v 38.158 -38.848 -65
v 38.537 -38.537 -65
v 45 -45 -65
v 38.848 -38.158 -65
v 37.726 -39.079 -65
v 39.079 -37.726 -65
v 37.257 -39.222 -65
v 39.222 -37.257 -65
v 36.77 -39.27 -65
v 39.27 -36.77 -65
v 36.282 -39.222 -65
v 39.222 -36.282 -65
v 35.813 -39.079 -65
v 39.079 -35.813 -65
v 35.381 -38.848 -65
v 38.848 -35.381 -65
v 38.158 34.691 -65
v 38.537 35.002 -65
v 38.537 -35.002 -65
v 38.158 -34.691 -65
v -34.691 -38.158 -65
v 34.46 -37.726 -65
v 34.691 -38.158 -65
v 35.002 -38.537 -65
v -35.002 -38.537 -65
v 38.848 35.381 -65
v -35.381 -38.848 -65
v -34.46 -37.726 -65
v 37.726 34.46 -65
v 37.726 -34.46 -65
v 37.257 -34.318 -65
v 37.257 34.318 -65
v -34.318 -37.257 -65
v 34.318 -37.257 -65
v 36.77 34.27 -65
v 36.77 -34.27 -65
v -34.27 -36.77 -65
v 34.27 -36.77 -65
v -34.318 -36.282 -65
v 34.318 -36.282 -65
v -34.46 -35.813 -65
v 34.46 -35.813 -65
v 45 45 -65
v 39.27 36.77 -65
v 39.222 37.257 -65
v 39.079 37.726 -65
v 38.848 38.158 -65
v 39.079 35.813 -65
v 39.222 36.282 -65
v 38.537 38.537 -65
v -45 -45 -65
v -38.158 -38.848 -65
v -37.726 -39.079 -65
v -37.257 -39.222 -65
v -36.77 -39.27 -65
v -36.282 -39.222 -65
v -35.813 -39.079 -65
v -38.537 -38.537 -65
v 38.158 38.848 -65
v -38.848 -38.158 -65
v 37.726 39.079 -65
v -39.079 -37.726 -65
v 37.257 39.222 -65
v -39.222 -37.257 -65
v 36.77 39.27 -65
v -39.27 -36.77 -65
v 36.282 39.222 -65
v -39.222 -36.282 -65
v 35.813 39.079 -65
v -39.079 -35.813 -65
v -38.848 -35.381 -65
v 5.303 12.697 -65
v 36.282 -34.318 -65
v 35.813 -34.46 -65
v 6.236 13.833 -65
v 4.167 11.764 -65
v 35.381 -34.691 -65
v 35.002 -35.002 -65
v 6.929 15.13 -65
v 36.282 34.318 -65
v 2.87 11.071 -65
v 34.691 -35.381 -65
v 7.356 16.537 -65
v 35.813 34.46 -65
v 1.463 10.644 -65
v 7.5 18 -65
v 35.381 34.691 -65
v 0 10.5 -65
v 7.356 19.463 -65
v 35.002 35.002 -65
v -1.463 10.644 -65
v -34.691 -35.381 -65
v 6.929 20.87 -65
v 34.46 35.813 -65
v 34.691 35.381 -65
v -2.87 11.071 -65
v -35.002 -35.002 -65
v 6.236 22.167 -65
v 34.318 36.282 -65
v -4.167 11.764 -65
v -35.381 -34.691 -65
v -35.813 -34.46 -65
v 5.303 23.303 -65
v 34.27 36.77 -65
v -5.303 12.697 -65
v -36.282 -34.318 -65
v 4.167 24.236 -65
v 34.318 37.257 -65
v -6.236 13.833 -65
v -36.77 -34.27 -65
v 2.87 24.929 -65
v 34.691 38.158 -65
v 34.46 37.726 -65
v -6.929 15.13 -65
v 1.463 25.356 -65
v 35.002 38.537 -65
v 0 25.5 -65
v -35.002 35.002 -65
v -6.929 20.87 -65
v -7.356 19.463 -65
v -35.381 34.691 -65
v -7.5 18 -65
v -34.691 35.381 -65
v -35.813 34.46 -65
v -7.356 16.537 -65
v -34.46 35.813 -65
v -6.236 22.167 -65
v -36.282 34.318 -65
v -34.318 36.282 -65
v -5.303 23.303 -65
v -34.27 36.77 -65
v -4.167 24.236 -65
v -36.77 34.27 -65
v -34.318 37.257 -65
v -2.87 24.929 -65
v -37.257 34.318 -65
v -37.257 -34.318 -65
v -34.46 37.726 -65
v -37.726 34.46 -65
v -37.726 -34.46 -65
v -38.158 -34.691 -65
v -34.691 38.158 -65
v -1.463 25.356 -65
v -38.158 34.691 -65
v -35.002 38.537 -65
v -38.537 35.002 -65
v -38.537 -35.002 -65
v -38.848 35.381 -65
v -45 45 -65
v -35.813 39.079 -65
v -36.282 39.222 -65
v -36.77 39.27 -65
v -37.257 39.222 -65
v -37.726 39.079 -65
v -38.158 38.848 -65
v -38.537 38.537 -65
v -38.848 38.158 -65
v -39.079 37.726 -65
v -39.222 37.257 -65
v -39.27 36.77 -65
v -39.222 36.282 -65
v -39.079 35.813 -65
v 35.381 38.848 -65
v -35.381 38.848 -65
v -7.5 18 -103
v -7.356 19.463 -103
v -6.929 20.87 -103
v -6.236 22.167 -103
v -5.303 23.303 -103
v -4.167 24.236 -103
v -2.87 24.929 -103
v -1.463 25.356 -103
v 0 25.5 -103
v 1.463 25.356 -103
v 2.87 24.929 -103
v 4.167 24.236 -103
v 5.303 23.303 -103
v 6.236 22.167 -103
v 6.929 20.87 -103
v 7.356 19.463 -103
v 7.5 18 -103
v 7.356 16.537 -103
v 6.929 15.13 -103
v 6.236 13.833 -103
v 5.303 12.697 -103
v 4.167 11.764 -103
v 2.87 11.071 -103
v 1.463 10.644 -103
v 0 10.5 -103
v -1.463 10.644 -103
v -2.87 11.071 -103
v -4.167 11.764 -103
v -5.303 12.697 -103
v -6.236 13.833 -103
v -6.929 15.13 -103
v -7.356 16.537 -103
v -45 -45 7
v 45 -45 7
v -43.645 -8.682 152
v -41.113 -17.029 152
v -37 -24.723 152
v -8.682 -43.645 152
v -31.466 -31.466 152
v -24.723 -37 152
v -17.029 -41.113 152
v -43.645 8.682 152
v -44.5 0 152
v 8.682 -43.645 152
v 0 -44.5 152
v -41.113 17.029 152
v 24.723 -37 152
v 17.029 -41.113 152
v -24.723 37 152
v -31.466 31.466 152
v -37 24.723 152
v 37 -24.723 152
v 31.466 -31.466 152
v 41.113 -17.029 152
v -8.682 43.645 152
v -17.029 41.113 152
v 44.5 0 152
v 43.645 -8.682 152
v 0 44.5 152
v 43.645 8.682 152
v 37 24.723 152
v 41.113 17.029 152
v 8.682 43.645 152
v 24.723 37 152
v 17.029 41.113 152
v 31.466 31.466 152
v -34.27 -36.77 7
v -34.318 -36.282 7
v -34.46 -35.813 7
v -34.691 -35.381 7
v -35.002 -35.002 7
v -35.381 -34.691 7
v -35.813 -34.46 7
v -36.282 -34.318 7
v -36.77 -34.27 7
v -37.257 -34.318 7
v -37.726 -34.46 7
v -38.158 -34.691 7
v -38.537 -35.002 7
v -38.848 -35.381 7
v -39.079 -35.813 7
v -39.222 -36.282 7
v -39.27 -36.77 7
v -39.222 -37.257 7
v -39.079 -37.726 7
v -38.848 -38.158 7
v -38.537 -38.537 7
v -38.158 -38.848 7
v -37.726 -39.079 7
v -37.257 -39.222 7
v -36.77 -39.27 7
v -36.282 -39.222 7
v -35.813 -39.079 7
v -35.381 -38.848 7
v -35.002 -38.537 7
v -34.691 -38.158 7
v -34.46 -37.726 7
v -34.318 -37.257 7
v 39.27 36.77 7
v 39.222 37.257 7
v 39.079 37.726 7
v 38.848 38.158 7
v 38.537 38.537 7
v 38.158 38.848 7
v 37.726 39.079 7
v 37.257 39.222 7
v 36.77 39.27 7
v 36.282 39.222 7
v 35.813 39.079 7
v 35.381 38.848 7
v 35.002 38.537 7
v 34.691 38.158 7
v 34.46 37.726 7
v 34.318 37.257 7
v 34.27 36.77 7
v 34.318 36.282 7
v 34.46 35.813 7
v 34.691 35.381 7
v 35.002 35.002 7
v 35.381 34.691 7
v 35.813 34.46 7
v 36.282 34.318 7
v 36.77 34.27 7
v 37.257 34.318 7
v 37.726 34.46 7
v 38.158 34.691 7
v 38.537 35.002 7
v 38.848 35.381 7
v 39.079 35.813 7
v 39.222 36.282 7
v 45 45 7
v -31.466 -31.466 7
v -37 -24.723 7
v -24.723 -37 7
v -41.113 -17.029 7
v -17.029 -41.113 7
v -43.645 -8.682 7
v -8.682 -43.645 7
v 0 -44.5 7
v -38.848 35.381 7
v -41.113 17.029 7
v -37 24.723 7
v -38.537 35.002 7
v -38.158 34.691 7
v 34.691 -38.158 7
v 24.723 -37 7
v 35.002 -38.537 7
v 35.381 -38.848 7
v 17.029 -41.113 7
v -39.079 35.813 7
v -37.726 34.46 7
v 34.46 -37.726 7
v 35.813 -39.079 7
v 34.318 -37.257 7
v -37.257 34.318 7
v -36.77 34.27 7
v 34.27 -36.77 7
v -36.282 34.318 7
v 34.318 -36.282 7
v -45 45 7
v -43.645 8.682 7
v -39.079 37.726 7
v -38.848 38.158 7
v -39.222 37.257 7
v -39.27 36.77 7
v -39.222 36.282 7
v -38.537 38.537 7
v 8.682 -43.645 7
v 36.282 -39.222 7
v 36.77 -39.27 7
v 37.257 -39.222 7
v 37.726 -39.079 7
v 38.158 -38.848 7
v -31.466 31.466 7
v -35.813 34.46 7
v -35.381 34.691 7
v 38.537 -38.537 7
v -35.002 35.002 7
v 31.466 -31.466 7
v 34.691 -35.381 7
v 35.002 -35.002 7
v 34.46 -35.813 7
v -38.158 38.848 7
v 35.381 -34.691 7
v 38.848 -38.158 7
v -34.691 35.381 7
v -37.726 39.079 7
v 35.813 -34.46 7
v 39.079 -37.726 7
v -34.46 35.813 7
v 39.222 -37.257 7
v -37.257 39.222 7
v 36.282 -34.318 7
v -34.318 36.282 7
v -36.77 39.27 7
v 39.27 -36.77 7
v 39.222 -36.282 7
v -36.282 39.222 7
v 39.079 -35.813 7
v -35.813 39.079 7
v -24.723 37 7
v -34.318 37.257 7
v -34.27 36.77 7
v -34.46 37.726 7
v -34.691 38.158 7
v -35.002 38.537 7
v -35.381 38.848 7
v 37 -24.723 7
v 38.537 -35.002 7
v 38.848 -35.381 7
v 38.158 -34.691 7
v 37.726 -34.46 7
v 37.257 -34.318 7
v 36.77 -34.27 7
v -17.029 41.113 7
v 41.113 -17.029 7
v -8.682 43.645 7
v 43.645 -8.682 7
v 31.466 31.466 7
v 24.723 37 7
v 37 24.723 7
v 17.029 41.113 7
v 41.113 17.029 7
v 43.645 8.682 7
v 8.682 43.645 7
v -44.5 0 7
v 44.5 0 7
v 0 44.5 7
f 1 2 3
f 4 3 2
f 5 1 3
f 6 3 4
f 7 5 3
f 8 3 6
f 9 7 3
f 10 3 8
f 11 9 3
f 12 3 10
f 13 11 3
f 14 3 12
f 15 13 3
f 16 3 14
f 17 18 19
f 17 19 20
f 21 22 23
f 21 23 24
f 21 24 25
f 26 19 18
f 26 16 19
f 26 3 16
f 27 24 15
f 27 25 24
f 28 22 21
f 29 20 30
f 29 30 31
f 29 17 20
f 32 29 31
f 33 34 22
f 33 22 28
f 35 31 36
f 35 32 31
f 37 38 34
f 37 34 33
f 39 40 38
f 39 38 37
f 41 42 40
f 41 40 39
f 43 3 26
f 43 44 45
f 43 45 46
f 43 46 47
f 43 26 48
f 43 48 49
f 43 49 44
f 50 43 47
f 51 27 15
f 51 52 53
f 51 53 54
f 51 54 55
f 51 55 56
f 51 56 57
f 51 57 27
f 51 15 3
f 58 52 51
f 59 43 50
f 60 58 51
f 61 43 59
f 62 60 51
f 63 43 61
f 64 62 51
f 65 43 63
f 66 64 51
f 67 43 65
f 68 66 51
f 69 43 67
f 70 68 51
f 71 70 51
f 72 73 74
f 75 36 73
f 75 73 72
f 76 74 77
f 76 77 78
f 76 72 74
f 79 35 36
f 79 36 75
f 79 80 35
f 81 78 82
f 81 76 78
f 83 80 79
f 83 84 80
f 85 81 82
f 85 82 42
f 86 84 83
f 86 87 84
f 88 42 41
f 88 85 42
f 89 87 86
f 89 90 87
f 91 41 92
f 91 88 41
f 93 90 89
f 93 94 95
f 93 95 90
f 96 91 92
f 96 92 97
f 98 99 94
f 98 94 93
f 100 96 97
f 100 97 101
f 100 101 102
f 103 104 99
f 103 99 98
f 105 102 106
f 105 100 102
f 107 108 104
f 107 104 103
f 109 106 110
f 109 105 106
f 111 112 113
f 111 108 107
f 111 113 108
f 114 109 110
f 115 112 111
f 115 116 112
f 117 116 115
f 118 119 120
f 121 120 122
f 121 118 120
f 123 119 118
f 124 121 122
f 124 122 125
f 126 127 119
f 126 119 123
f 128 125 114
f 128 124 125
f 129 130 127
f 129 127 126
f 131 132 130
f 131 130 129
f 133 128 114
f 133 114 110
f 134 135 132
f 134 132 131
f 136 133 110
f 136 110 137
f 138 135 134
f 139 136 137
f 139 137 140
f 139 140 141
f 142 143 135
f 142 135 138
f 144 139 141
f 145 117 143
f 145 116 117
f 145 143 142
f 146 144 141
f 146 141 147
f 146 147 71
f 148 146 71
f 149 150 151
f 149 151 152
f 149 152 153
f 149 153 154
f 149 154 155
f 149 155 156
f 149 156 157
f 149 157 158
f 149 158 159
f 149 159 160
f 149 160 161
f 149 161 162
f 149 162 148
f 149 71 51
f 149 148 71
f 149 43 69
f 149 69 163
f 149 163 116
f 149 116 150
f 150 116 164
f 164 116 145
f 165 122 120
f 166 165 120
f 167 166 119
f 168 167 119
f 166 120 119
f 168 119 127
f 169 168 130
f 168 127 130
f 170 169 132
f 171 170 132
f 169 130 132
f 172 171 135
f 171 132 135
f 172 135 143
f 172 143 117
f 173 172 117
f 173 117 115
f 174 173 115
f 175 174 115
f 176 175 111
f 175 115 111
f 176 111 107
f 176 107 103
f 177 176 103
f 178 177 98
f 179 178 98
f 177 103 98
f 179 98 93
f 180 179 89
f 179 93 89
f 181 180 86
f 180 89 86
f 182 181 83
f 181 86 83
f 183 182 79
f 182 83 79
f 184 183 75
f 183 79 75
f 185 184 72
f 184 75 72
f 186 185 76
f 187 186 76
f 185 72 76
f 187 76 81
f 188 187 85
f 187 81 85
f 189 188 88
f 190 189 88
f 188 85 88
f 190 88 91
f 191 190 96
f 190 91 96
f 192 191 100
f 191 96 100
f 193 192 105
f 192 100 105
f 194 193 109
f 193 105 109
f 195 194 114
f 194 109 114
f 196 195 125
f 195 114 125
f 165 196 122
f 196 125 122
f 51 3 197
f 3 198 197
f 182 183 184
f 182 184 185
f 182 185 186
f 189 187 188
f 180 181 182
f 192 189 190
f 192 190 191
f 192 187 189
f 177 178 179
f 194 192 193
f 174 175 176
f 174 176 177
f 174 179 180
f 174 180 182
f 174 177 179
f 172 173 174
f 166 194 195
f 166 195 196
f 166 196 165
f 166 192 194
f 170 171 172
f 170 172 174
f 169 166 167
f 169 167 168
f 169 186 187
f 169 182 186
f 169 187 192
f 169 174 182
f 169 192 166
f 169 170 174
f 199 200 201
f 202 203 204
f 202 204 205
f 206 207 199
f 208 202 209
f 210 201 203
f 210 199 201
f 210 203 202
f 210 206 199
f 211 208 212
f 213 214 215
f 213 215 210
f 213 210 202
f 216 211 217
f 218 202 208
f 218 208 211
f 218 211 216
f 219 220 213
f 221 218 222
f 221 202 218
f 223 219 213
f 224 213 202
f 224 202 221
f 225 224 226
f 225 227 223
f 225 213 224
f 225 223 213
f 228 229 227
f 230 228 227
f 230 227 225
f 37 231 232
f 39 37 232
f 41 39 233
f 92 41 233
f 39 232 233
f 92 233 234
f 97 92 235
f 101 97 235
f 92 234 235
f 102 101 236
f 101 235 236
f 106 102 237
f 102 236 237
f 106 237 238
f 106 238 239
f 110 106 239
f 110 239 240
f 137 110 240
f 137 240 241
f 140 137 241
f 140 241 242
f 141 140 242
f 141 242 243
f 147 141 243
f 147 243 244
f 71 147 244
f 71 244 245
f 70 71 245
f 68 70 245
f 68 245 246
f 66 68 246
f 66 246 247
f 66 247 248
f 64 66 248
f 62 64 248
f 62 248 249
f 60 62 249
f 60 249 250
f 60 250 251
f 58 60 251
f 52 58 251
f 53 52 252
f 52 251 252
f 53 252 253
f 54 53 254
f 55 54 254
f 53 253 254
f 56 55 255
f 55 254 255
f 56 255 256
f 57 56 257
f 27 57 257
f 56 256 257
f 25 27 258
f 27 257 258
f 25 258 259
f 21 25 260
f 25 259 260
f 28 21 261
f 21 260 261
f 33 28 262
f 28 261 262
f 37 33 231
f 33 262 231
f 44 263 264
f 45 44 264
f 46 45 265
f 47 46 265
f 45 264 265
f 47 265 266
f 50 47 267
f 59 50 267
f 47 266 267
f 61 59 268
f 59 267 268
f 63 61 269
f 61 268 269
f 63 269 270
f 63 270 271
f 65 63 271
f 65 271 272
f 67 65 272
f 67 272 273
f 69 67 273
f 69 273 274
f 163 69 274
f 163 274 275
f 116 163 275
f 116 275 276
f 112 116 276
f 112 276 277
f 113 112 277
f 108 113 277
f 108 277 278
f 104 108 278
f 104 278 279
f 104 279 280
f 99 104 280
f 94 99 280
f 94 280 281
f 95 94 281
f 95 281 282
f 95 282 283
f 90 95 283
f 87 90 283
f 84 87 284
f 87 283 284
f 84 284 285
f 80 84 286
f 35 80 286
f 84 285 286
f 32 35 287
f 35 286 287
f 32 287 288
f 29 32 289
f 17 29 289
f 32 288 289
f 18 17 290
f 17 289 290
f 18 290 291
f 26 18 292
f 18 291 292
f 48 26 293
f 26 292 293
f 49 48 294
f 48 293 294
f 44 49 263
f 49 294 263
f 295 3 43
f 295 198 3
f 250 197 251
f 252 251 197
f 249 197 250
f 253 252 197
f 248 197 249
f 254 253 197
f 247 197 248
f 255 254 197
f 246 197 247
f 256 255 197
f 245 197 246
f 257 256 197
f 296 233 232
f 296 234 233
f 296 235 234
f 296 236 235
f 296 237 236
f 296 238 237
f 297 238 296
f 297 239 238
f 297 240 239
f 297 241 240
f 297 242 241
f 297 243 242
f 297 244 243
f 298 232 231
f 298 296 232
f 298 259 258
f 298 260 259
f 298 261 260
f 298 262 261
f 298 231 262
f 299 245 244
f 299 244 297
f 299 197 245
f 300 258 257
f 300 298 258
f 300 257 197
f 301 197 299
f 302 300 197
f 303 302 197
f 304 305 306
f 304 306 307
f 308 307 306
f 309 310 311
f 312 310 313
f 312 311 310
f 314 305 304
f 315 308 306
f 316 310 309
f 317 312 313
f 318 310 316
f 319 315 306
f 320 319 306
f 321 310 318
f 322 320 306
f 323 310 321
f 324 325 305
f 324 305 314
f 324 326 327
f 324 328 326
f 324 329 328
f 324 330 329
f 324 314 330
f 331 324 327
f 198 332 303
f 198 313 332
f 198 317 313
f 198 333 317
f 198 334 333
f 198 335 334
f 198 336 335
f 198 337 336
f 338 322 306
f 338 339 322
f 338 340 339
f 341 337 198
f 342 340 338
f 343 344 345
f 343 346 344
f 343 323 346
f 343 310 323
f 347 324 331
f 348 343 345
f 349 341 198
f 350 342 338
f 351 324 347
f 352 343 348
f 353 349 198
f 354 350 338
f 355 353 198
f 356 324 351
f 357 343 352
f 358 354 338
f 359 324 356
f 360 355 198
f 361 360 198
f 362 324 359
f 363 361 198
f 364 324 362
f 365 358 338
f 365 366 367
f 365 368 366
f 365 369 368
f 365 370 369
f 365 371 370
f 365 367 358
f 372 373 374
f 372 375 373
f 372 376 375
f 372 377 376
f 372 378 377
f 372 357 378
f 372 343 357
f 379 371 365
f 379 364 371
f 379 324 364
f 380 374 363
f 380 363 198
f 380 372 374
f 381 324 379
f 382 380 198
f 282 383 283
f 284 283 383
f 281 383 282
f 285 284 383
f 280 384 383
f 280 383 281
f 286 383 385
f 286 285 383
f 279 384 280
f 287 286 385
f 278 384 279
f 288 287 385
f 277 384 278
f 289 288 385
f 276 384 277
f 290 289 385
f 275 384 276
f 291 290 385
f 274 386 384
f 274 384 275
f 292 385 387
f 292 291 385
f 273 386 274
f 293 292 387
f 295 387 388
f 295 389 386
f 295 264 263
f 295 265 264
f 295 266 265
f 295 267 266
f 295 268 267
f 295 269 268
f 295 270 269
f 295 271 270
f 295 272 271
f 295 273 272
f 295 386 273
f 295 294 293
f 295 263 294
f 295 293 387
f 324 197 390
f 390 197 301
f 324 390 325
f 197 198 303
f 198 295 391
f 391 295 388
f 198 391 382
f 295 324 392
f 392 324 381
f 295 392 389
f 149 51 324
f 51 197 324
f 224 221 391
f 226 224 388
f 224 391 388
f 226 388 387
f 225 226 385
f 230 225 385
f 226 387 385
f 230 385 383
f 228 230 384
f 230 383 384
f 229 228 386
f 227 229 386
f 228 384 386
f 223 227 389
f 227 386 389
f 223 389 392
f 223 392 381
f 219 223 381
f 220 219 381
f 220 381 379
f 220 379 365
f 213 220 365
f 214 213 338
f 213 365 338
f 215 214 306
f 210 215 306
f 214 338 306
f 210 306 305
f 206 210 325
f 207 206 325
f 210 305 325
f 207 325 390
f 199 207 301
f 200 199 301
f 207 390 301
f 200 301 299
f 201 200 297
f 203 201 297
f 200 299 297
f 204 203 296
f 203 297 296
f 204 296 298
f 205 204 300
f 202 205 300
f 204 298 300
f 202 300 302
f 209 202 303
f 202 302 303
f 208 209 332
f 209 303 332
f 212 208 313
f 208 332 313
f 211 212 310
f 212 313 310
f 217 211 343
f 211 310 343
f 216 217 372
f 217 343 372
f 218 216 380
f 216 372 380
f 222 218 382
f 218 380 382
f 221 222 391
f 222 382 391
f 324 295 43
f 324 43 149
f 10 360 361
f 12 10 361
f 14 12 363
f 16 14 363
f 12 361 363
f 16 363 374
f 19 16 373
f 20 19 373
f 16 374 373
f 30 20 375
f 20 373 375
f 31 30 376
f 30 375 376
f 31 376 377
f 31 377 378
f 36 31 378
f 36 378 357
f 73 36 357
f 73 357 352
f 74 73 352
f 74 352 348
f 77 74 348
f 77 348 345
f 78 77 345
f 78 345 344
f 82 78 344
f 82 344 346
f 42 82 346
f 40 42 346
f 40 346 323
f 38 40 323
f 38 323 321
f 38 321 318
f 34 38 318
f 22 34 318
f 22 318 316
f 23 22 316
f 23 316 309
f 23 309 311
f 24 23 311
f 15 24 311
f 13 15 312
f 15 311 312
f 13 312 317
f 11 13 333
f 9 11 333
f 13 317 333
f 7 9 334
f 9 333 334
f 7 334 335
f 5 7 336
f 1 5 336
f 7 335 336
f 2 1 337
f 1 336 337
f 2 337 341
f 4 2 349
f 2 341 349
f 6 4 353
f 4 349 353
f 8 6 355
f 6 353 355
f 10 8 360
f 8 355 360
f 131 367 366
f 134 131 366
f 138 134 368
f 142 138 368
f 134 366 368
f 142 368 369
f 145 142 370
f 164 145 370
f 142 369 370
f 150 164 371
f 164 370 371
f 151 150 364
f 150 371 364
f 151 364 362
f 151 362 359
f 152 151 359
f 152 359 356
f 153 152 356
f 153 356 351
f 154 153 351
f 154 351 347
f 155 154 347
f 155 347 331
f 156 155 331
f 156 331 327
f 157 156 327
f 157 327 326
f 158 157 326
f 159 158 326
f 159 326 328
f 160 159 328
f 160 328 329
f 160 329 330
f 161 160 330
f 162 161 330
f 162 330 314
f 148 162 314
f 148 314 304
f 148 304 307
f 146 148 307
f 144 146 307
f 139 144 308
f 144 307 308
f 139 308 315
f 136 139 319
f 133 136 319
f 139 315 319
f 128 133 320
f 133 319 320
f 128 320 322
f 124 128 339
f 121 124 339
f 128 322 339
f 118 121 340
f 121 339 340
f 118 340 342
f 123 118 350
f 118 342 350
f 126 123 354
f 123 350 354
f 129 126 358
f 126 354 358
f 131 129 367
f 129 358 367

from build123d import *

# Parameters (mm, degrees)
SKETCH_2_W         = 90
SKETCH_2_H         = 90
EXTRUDE_1_DEPTH    = 7
SKETCH_3_R         = 44.5
EXTRUDE_2_DEPTH    = 145
SKETCH_4_W         = 90
SKETCH_4_H         = 90
EXTRUDE_3_DEPTH    = 65
SKETCH_6_R         = 7.5
EXTRUDE_4_DEPTH    = 38
HOLE_WIZARD_M6_1_D = 5


with BuildPart() as part:
    # 草图2 → 凸台-拉伸1 (new body)
    with BuildSketch(Plane.XY):
        Rectangle(SKETCH_2_W, SKETCH_2_H)
    extrude(amount=EXTRUDE_1_DEPTH)

    # 草图3 → 凸台-拉伸2 (add)
    with BuildSketch(Plane.XY.offset(7)):
        Circle(SKETCH_3_R)
    extrude(amount=EXTRUDE_2_DEPTH)

    # 草图4 → 凸台-拉伸3 (add)
    with BuildSketch(Plane(origin=(0, 0, 0), x_dir=(-1, 0, 0), z_dir=(0, 0, -1))):
        Rectangle(SKETCH_4_W, SKETCH_4_H)
    extrude(amount=EXTRUDE_3_DEPTH)

    # 草图6 → 凸台-拉伸4 (add)
    with BuildSketch(Plane(origin=(0, 0, -65), x_dir=(-1, 0, 0), z_dir=(0, 0, -1))):
        with Locations((0, 18)):
            Circle(SKETCH_6_R)
    extrude(amount=EXTRUDE_4_DEPTH)

    # M6 螺纹孔1 (through all)
    with Locations(Plane(origin=(36.769552622, 36.769552622, -65), x_dir=(-1, 0, 0), z_dir=(0, 0, -1))):
        with Locations((0, 0), (73.539105244, 0), (73.539105244, -73.539105244), (0, -73.539105244)):
            Hole(HOLE_WIZARD_M6_1_D / 2)


solid = part.part
